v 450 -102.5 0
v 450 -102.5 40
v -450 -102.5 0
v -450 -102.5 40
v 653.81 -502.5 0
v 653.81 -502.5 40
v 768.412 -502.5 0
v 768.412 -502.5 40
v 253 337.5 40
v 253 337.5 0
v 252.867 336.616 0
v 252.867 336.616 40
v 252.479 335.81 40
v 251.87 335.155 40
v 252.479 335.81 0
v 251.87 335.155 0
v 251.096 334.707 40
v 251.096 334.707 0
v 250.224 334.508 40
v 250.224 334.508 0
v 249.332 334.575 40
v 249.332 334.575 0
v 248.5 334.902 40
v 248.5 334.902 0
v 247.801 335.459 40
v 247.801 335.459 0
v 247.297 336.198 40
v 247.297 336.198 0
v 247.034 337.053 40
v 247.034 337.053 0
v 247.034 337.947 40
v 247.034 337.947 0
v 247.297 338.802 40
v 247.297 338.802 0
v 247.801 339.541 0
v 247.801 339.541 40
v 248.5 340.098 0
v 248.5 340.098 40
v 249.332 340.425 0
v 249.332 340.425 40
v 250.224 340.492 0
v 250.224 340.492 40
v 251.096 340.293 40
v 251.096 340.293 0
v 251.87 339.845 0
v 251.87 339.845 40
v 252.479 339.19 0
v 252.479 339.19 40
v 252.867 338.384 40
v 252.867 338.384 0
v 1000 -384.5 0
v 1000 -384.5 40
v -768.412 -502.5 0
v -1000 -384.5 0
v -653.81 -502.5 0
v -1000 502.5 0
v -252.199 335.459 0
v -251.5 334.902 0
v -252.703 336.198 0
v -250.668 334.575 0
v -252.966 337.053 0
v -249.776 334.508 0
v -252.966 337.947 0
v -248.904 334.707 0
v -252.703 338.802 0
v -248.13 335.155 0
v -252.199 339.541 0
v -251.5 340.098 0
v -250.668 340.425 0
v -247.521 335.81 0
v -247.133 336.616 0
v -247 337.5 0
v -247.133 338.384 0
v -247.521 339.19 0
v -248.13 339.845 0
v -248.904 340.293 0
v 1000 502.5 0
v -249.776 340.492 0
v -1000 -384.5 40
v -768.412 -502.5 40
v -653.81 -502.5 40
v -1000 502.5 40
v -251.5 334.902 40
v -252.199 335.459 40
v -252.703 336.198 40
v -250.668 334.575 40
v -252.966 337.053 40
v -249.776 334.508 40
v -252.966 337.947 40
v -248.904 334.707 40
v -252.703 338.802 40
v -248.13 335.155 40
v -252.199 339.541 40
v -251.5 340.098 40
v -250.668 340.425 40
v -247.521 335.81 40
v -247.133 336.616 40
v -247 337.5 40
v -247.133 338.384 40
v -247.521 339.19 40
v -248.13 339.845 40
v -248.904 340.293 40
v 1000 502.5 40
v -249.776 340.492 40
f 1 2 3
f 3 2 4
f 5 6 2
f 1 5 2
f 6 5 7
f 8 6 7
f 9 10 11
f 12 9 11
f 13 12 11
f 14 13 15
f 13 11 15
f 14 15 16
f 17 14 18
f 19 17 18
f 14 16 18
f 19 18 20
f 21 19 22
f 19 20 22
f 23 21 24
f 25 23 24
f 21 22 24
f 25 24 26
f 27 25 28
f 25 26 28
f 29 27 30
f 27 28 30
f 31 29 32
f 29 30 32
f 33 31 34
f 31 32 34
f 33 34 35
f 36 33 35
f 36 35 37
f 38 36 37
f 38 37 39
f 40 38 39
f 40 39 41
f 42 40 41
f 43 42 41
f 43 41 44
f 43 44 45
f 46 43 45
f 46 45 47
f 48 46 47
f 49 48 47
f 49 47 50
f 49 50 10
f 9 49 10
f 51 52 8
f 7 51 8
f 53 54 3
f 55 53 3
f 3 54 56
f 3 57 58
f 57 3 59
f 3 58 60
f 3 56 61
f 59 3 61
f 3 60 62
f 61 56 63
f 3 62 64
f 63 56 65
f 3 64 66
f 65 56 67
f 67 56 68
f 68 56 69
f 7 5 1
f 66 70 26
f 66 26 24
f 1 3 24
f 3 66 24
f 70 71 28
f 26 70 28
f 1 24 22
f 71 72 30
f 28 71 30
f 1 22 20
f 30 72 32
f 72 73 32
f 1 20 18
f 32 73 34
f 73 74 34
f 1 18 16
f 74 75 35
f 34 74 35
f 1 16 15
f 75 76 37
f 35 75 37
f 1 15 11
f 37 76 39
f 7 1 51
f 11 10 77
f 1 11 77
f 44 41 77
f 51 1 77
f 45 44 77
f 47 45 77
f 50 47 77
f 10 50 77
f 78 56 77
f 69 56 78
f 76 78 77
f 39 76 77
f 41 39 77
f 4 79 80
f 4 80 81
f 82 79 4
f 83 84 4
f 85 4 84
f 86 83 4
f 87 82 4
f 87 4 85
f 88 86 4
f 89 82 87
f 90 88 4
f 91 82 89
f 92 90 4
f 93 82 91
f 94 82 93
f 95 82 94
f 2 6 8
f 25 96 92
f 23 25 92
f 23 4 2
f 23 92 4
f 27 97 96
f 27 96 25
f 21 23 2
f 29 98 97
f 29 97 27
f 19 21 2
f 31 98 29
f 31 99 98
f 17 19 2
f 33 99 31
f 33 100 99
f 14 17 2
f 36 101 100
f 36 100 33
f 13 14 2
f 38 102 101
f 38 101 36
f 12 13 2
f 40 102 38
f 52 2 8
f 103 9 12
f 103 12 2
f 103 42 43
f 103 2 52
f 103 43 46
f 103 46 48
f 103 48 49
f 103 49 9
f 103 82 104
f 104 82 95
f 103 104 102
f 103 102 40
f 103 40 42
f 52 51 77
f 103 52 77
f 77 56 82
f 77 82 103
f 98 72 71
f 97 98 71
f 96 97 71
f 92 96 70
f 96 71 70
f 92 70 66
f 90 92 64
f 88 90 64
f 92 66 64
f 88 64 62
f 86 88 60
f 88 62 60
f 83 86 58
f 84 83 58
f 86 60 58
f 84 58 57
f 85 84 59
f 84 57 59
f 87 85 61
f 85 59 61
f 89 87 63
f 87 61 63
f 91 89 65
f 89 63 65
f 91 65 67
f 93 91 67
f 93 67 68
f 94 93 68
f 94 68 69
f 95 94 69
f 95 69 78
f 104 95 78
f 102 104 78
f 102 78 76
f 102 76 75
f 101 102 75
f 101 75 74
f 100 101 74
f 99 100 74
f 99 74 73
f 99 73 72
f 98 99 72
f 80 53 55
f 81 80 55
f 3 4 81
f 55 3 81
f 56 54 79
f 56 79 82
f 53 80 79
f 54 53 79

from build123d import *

# Parameters (mm, degrees)
F0_W     = 2000
F0_H     = 1005
F1_DEPTH = 40
F3_DEPTH = 40.001
F5_R     = 3
F6_DEPTH = 40.001
F8_DEPTH = 40.001


with BuildPart() as f1:
    # F0 (on Top) → F1 (new body)
    with BuildSketch(Plane.XY):
        Rectangle(F0_W, F0_H)
    extrude(amount=F1_DEPTH)

    # F2 (on face) → F3 (cut, through all)
    with BuildSketch(Plane.XY.offset(40)):
        Polygon((-450, -102.5), (-653.81018, -502.5), (0, -502.5), (653.81018, -502.5), (450, -102.5), (0, -102.5), align=None)
    extrude(amount=-F3_DEPTH, mode=Mode.SUBTRACT)

    # F5 (on face) → F6 (cut, through all)
    with BuildSketch(Plane(origin=(0, 0, 0), x_dir=(1, 0, 0), z_dir=(0, 0, -1))):
        with Locations((-250, -337.5)):
            Circle(F5_R)
        with Locations((250, -337.5)):
            Circle(F5_R)
    extrude(amount=-F6_DEPTH, mode=Mode.SUBTRACT)

    # F7 (on face) → F8 (cut, through all)
    with BuildSketch(Plane.XY.offset(40)):
        Polygon((-768.41196, -502.5), (-1000, -384.5), (-1000, -502.5), align=None)
        Polygon((1000, -502.5), (1000, -384.5), (768.41196, -502.5), align=None)
    extrude(amount=-F8_DEPTH, mode=Mode.SUBTRACT)


solid = f1.part
